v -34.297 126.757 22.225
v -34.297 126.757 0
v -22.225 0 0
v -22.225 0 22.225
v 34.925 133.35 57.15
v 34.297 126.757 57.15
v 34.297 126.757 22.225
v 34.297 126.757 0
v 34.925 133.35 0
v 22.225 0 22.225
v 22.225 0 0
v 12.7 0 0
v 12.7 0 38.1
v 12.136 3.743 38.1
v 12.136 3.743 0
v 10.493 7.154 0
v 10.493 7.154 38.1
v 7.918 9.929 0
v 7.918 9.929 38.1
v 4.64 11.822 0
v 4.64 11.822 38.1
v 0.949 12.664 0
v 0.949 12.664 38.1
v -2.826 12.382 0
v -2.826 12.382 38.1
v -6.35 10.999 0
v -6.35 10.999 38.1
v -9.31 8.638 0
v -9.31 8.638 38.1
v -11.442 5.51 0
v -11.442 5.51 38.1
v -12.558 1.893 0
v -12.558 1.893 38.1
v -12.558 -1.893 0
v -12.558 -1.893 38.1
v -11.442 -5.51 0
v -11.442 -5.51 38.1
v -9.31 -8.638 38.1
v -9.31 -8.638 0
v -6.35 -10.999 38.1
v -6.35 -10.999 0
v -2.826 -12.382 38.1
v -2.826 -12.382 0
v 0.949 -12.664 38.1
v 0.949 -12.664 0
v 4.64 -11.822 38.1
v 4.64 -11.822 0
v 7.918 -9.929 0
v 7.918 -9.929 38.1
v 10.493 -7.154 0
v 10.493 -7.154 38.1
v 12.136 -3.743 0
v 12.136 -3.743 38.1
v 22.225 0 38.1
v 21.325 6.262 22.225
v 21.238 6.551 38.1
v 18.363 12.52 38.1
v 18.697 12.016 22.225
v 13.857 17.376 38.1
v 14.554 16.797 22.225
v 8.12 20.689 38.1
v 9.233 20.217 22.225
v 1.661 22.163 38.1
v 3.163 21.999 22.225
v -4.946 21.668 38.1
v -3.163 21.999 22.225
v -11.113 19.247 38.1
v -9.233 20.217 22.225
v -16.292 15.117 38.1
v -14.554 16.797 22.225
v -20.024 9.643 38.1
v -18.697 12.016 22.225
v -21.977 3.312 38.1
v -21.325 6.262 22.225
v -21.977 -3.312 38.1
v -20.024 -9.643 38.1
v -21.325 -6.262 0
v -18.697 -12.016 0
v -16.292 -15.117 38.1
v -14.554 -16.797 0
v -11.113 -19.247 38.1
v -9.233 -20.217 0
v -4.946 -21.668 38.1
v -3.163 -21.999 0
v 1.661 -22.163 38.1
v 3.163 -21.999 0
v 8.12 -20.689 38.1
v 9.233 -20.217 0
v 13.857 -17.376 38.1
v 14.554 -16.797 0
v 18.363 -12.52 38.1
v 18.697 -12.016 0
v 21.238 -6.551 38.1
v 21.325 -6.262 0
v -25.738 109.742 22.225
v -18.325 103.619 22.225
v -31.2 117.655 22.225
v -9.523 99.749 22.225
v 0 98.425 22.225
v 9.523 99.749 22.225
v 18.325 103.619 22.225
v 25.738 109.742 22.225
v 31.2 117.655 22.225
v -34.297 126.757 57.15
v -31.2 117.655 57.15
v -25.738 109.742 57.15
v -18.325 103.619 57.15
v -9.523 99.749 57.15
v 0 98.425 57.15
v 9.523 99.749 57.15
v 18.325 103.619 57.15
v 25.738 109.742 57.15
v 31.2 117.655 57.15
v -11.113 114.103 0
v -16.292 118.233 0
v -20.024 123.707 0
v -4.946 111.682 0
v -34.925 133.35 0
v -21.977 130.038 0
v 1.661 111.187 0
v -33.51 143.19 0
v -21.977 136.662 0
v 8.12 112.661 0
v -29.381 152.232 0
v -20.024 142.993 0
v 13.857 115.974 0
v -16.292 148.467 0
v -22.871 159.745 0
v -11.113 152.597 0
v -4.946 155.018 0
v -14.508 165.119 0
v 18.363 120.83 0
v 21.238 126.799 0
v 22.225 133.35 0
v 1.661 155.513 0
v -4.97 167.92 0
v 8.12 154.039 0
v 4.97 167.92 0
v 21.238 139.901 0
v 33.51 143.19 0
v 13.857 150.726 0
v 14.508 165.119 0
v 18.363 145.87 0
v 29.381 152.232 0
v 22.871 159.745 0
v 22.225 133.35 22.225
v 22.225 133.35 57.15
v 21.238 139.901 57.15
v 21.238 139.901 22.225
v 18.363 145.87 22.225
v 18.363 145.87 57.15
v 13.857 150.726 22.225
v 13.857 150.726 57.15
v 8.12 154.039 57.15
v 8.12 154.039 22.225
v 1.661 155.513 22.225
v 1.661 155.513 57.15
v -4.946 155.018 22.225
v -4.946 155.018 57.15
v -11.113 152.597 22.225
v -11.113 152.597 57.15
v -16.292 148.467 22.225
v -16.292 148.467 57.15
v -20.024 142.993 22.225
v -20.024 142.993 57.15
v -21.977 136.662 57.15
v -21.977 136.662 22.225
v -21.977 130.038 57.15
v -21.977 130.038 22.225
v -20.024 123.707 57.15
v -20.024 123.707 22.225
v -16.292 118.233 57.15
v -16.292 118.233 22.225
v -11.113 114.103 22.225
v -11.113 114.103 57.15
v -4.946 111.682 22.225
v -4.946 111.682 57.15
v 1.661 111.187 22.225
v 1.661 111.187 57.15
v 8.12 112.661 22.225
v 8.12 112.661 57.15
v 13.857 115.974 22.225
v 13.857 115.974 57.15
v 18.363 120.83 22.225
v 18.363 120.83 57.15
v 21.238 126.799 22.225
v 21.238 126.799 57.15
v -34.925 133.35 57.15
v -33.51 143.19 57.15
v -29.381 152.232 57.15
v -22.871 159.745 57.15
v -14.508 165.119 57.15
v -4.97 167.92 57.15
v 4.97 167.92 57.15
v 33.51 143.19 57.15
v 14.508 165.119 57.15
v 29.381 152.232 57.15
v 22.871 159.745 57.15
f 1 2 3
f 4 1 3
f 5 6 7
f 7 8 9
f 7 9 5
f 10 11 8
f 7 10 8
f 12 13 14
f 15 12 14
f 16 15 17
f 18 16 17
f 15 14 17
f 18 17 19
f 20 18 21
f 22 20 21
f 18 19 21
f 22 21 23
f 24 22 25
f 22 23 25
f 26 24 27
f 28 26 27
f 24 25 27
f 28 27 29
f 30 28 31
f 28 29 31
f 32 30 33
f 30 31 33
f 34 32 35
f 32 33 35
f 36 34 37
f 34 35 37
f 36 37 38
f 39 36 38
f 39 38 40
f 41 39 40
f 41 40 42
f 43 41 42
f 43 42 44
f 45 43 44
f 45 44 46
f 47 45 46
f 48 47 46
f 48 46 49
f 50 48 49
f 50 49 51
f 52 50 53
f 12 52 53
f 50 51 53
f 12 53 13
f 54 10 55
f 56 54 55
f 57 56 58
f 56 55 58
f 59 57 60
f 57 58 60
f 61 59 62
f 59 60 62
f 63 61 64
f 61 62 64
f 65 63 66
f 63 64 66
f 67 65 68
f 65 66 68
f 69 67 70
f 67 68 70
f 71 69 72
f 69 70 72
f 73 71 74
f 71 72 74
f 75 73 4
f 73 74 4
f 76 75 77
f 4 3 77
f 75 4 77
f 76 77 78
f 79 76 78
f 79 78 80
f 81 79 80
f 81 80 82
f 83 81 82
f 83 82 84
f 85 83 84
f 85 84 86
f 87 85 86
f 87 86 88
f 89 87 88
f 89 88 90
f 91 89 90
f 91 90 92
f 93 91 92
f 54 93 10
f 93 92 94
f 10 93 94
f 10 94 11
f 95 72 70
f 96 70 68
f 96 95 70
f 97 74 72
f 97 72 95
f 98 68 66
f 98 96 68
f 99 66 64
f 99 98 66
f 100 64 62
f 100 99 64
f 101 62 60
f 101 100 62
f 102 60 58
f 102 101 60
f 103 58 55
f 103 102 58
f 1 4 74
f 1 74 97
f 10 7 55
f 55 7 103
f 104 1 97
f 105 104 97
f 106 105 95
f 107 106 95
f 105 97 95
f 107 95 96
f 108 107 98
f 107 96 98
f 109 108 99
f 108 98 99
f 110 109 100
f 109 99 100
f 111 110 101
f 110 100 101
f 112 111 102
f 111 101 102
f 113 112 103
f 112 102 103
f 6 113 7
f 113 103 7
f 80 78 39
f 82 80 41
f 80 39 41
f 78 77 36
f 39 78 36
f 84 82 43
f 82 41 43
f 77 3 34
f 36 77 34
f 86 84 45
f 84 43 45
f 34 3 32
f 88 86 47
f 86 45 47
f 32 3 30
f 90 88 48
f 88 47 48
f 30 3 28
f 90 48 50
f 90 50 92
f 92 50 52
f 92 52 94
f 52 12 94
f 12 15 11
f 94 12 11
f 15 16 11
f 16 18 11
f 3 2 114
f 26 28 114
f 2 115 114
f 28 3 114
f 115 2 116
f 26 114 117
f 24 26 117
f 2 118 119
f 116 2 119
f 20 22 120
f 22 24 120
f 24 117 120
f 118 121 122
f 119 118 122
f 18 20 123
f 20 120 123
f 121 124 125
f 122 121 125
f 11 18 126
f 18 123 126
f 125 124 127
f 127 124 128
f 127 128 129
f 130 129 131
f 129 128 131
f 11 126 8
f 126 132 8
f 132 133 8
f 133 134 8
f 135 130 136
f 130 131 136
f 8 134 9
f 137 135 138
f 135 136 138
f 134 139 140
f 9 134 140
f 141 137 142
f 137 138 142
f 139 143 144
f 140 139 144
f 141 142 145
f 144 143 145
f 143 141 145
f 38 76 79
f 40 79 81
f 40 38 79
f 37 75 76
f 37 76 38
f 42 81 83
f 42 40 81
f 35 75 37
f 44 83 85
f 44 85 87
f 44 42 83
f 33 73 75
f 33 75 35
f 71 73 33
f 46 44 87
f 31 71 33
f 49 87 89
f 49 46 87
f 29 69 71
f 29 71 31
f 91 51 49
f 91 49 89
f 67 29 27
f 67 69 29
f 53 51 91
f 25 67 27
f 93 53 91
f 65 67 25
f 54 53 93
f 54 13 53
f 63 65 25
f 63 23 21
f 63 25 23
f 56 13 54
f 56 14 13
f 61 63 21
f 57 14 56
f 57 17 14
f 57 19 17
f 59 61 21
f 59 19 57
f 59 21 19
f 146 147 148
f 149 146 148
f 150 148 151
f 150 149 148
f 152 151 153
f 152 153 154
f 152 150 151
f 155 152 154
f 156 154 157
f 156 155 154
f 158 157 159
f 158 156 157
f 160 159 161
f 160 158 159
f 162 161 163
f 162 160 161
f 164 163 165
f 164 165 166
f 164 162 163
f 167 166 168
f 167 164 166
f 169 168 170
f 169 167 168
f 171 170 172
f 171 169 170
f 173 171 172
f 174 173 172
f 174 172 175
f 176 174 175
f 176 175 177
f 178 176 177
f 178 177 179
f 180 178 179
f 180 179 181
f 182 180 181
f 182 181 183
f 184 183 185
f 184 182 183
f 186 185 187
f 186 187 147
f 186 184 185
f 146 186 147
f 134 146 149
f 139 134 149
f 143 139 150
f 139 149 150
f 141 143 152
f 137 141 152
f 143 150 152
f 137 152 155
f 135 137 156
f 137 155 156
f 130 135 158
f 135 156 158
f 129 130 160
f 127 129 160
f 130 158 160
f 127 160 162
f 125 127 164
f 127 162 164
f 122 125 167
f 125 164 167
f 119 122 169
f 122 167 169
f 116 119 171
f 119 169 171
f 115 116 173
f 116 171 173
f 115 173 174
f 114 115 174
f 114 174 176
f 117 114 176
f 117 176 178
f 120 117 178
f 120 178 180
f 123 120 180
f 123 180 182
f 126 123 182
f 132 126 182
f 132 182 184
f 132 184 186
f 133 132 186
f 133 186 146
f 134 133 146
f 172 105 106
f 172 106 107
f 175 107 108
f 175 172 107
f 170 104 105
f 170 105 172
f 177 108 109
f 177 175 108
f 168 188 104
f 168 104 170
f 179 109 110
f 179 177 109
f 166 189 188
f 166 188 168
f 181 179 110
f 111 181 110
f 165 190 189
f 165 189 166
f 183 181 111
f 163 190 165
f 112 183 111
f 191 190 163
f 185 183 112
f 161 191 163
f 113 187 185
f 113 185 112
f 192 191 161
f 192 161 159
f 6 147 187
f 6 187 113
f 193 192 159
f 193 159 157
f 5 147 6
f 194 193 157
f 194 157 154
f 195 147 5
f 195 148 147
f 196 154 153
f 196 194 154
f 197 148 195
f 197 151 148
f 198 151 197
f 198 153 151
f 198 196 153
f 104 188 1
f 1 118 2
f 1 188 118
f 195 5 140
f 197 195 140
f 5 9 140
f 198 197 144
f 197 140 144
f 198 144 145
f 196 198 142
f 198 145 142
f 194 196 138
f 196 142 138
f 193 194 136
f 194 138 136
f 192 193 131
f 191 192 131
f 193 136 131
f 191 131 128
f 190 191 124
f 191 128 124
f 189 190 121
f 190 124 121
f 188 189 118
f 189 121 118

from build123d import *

# Parameters (mm, degrees)
F0_R     = 22.225
F0_R_2   = 12.7
F1_DEPTH = 22.225
F2_R     = 22.225
F3_DEPTH = 34.925
F4_DEPTH = 50.8
F5_R     = 12.7
F6_DEPTH = 15.875
F7_R     = 12.7
F8_DEPTH = 38.1


# Not quite as in the source:
# - a length typed as a fraction of an inch, garbled in the dataset ("3 / 203.2 mm" for 3/8 in), is restored


with BuildPart() as f1:
    # F0 (on Top) → F1 (new body)
    with BuildSketch(Plane.XY):
        with BuildLine():
            Line((22.225, 0), (34.2971348315, 126.7574157303))
            ThreePointArc((34.2971348315, 126.7574157303), (0, 98.425), (-34.2971348315, 126.7574157303))
            Line((-34.2971348315, 126.7574157303), (-22.225, 0))
            ThreePointArc((-22.225, 0), (0, 22.225), (22.225, 0))
        make_face()
        with BuildLine():
            Line((34.2971348315, 126.7574157303), (34.925, 133.35))
            ThreePointArc((34.925, 133.35), (0, 168.275), (-34.925, 133.35))
            Line((-34.925, 133.35), (-34.2971348315, 126.7574157303))
            ThreePointArc((-34.2971348315, 126.7574157303), (0, 98.425), (34.2971348315, 126.7574157303))
        make_face()
        with Locations((0, 133.35)):
            Circle(F0_R, mode=Mode.SUBTRACT)
        with BuildLine():
            ThreePointArc((-22.225, 0), (0, -22.225), (22.225, 0))
            ThreePointArc((22.225, 0), (0, 22.225), (-22.225, 0))
        make_face()
        Circle(F0_R_2, mode=Mode.SUBTRACT)
        with Locations((0, 133.35)):
            Circle(F0_R)
        Circle(F0_R_2)
    extrude(amount=F1_DEPTH)

    # F2 (on face) → F3 (join)
    with BuildSketch(Plane.XY.offset(22.225)):
        with BuildLine():
            ThreePointArc((-34.2971348315, 126.7574157303), (0, 98.425), (34.2971348315, 126.7574157303))
            Line((34.2971348315, 126.7574157303), (34.925, 133.35))
            ThreePointArc((34.925, 133.35), (0, 168.275), (-34.925, 133.35))
            Line((-34.925, 133.35), (-34.2971348315, 126.7574157303))
        make_face()
        with Locations((0, 133.35)):
            Circle(F2_R, mode=Mode.SUBTRACT)
    extrude(amount=F3_DEPTH)

    # F4 (cut): a face of the model
    f4_faces = [f1.faces().sort_by_distance(p)[0] for p in [
        (0, 133.35, 22.225),
    ]]
    extrude(f4_faces, amount=-F4_DEPTH, mode=Mode.SUBTRACT)

    # F5 (on face) → F6 (join)
    with BuildSketch(Plane.XY.offset(22.225)):
        with BuildLine():
            ThreePointArc((-22.225, 0), (0, -22.225), (22.225, 0))
            ThreePointArc((22.225, 0), (0, 22.225), (-22.225, 0))
        make_face()
        Circle(F5_R, mode=Mode.SUBTRACT)
        Circle(F5_R)
    extrude(amount=F6_DEPTH)

    # F7 (on face) → F8 (cut)
    with BuildSketch(Plane.XY.offset(38.1)):
        Circle(F7_R)
    extrude(amount=-F8_DEPTH, mode=Mode.SUBTRACT)


solid = f1.part
